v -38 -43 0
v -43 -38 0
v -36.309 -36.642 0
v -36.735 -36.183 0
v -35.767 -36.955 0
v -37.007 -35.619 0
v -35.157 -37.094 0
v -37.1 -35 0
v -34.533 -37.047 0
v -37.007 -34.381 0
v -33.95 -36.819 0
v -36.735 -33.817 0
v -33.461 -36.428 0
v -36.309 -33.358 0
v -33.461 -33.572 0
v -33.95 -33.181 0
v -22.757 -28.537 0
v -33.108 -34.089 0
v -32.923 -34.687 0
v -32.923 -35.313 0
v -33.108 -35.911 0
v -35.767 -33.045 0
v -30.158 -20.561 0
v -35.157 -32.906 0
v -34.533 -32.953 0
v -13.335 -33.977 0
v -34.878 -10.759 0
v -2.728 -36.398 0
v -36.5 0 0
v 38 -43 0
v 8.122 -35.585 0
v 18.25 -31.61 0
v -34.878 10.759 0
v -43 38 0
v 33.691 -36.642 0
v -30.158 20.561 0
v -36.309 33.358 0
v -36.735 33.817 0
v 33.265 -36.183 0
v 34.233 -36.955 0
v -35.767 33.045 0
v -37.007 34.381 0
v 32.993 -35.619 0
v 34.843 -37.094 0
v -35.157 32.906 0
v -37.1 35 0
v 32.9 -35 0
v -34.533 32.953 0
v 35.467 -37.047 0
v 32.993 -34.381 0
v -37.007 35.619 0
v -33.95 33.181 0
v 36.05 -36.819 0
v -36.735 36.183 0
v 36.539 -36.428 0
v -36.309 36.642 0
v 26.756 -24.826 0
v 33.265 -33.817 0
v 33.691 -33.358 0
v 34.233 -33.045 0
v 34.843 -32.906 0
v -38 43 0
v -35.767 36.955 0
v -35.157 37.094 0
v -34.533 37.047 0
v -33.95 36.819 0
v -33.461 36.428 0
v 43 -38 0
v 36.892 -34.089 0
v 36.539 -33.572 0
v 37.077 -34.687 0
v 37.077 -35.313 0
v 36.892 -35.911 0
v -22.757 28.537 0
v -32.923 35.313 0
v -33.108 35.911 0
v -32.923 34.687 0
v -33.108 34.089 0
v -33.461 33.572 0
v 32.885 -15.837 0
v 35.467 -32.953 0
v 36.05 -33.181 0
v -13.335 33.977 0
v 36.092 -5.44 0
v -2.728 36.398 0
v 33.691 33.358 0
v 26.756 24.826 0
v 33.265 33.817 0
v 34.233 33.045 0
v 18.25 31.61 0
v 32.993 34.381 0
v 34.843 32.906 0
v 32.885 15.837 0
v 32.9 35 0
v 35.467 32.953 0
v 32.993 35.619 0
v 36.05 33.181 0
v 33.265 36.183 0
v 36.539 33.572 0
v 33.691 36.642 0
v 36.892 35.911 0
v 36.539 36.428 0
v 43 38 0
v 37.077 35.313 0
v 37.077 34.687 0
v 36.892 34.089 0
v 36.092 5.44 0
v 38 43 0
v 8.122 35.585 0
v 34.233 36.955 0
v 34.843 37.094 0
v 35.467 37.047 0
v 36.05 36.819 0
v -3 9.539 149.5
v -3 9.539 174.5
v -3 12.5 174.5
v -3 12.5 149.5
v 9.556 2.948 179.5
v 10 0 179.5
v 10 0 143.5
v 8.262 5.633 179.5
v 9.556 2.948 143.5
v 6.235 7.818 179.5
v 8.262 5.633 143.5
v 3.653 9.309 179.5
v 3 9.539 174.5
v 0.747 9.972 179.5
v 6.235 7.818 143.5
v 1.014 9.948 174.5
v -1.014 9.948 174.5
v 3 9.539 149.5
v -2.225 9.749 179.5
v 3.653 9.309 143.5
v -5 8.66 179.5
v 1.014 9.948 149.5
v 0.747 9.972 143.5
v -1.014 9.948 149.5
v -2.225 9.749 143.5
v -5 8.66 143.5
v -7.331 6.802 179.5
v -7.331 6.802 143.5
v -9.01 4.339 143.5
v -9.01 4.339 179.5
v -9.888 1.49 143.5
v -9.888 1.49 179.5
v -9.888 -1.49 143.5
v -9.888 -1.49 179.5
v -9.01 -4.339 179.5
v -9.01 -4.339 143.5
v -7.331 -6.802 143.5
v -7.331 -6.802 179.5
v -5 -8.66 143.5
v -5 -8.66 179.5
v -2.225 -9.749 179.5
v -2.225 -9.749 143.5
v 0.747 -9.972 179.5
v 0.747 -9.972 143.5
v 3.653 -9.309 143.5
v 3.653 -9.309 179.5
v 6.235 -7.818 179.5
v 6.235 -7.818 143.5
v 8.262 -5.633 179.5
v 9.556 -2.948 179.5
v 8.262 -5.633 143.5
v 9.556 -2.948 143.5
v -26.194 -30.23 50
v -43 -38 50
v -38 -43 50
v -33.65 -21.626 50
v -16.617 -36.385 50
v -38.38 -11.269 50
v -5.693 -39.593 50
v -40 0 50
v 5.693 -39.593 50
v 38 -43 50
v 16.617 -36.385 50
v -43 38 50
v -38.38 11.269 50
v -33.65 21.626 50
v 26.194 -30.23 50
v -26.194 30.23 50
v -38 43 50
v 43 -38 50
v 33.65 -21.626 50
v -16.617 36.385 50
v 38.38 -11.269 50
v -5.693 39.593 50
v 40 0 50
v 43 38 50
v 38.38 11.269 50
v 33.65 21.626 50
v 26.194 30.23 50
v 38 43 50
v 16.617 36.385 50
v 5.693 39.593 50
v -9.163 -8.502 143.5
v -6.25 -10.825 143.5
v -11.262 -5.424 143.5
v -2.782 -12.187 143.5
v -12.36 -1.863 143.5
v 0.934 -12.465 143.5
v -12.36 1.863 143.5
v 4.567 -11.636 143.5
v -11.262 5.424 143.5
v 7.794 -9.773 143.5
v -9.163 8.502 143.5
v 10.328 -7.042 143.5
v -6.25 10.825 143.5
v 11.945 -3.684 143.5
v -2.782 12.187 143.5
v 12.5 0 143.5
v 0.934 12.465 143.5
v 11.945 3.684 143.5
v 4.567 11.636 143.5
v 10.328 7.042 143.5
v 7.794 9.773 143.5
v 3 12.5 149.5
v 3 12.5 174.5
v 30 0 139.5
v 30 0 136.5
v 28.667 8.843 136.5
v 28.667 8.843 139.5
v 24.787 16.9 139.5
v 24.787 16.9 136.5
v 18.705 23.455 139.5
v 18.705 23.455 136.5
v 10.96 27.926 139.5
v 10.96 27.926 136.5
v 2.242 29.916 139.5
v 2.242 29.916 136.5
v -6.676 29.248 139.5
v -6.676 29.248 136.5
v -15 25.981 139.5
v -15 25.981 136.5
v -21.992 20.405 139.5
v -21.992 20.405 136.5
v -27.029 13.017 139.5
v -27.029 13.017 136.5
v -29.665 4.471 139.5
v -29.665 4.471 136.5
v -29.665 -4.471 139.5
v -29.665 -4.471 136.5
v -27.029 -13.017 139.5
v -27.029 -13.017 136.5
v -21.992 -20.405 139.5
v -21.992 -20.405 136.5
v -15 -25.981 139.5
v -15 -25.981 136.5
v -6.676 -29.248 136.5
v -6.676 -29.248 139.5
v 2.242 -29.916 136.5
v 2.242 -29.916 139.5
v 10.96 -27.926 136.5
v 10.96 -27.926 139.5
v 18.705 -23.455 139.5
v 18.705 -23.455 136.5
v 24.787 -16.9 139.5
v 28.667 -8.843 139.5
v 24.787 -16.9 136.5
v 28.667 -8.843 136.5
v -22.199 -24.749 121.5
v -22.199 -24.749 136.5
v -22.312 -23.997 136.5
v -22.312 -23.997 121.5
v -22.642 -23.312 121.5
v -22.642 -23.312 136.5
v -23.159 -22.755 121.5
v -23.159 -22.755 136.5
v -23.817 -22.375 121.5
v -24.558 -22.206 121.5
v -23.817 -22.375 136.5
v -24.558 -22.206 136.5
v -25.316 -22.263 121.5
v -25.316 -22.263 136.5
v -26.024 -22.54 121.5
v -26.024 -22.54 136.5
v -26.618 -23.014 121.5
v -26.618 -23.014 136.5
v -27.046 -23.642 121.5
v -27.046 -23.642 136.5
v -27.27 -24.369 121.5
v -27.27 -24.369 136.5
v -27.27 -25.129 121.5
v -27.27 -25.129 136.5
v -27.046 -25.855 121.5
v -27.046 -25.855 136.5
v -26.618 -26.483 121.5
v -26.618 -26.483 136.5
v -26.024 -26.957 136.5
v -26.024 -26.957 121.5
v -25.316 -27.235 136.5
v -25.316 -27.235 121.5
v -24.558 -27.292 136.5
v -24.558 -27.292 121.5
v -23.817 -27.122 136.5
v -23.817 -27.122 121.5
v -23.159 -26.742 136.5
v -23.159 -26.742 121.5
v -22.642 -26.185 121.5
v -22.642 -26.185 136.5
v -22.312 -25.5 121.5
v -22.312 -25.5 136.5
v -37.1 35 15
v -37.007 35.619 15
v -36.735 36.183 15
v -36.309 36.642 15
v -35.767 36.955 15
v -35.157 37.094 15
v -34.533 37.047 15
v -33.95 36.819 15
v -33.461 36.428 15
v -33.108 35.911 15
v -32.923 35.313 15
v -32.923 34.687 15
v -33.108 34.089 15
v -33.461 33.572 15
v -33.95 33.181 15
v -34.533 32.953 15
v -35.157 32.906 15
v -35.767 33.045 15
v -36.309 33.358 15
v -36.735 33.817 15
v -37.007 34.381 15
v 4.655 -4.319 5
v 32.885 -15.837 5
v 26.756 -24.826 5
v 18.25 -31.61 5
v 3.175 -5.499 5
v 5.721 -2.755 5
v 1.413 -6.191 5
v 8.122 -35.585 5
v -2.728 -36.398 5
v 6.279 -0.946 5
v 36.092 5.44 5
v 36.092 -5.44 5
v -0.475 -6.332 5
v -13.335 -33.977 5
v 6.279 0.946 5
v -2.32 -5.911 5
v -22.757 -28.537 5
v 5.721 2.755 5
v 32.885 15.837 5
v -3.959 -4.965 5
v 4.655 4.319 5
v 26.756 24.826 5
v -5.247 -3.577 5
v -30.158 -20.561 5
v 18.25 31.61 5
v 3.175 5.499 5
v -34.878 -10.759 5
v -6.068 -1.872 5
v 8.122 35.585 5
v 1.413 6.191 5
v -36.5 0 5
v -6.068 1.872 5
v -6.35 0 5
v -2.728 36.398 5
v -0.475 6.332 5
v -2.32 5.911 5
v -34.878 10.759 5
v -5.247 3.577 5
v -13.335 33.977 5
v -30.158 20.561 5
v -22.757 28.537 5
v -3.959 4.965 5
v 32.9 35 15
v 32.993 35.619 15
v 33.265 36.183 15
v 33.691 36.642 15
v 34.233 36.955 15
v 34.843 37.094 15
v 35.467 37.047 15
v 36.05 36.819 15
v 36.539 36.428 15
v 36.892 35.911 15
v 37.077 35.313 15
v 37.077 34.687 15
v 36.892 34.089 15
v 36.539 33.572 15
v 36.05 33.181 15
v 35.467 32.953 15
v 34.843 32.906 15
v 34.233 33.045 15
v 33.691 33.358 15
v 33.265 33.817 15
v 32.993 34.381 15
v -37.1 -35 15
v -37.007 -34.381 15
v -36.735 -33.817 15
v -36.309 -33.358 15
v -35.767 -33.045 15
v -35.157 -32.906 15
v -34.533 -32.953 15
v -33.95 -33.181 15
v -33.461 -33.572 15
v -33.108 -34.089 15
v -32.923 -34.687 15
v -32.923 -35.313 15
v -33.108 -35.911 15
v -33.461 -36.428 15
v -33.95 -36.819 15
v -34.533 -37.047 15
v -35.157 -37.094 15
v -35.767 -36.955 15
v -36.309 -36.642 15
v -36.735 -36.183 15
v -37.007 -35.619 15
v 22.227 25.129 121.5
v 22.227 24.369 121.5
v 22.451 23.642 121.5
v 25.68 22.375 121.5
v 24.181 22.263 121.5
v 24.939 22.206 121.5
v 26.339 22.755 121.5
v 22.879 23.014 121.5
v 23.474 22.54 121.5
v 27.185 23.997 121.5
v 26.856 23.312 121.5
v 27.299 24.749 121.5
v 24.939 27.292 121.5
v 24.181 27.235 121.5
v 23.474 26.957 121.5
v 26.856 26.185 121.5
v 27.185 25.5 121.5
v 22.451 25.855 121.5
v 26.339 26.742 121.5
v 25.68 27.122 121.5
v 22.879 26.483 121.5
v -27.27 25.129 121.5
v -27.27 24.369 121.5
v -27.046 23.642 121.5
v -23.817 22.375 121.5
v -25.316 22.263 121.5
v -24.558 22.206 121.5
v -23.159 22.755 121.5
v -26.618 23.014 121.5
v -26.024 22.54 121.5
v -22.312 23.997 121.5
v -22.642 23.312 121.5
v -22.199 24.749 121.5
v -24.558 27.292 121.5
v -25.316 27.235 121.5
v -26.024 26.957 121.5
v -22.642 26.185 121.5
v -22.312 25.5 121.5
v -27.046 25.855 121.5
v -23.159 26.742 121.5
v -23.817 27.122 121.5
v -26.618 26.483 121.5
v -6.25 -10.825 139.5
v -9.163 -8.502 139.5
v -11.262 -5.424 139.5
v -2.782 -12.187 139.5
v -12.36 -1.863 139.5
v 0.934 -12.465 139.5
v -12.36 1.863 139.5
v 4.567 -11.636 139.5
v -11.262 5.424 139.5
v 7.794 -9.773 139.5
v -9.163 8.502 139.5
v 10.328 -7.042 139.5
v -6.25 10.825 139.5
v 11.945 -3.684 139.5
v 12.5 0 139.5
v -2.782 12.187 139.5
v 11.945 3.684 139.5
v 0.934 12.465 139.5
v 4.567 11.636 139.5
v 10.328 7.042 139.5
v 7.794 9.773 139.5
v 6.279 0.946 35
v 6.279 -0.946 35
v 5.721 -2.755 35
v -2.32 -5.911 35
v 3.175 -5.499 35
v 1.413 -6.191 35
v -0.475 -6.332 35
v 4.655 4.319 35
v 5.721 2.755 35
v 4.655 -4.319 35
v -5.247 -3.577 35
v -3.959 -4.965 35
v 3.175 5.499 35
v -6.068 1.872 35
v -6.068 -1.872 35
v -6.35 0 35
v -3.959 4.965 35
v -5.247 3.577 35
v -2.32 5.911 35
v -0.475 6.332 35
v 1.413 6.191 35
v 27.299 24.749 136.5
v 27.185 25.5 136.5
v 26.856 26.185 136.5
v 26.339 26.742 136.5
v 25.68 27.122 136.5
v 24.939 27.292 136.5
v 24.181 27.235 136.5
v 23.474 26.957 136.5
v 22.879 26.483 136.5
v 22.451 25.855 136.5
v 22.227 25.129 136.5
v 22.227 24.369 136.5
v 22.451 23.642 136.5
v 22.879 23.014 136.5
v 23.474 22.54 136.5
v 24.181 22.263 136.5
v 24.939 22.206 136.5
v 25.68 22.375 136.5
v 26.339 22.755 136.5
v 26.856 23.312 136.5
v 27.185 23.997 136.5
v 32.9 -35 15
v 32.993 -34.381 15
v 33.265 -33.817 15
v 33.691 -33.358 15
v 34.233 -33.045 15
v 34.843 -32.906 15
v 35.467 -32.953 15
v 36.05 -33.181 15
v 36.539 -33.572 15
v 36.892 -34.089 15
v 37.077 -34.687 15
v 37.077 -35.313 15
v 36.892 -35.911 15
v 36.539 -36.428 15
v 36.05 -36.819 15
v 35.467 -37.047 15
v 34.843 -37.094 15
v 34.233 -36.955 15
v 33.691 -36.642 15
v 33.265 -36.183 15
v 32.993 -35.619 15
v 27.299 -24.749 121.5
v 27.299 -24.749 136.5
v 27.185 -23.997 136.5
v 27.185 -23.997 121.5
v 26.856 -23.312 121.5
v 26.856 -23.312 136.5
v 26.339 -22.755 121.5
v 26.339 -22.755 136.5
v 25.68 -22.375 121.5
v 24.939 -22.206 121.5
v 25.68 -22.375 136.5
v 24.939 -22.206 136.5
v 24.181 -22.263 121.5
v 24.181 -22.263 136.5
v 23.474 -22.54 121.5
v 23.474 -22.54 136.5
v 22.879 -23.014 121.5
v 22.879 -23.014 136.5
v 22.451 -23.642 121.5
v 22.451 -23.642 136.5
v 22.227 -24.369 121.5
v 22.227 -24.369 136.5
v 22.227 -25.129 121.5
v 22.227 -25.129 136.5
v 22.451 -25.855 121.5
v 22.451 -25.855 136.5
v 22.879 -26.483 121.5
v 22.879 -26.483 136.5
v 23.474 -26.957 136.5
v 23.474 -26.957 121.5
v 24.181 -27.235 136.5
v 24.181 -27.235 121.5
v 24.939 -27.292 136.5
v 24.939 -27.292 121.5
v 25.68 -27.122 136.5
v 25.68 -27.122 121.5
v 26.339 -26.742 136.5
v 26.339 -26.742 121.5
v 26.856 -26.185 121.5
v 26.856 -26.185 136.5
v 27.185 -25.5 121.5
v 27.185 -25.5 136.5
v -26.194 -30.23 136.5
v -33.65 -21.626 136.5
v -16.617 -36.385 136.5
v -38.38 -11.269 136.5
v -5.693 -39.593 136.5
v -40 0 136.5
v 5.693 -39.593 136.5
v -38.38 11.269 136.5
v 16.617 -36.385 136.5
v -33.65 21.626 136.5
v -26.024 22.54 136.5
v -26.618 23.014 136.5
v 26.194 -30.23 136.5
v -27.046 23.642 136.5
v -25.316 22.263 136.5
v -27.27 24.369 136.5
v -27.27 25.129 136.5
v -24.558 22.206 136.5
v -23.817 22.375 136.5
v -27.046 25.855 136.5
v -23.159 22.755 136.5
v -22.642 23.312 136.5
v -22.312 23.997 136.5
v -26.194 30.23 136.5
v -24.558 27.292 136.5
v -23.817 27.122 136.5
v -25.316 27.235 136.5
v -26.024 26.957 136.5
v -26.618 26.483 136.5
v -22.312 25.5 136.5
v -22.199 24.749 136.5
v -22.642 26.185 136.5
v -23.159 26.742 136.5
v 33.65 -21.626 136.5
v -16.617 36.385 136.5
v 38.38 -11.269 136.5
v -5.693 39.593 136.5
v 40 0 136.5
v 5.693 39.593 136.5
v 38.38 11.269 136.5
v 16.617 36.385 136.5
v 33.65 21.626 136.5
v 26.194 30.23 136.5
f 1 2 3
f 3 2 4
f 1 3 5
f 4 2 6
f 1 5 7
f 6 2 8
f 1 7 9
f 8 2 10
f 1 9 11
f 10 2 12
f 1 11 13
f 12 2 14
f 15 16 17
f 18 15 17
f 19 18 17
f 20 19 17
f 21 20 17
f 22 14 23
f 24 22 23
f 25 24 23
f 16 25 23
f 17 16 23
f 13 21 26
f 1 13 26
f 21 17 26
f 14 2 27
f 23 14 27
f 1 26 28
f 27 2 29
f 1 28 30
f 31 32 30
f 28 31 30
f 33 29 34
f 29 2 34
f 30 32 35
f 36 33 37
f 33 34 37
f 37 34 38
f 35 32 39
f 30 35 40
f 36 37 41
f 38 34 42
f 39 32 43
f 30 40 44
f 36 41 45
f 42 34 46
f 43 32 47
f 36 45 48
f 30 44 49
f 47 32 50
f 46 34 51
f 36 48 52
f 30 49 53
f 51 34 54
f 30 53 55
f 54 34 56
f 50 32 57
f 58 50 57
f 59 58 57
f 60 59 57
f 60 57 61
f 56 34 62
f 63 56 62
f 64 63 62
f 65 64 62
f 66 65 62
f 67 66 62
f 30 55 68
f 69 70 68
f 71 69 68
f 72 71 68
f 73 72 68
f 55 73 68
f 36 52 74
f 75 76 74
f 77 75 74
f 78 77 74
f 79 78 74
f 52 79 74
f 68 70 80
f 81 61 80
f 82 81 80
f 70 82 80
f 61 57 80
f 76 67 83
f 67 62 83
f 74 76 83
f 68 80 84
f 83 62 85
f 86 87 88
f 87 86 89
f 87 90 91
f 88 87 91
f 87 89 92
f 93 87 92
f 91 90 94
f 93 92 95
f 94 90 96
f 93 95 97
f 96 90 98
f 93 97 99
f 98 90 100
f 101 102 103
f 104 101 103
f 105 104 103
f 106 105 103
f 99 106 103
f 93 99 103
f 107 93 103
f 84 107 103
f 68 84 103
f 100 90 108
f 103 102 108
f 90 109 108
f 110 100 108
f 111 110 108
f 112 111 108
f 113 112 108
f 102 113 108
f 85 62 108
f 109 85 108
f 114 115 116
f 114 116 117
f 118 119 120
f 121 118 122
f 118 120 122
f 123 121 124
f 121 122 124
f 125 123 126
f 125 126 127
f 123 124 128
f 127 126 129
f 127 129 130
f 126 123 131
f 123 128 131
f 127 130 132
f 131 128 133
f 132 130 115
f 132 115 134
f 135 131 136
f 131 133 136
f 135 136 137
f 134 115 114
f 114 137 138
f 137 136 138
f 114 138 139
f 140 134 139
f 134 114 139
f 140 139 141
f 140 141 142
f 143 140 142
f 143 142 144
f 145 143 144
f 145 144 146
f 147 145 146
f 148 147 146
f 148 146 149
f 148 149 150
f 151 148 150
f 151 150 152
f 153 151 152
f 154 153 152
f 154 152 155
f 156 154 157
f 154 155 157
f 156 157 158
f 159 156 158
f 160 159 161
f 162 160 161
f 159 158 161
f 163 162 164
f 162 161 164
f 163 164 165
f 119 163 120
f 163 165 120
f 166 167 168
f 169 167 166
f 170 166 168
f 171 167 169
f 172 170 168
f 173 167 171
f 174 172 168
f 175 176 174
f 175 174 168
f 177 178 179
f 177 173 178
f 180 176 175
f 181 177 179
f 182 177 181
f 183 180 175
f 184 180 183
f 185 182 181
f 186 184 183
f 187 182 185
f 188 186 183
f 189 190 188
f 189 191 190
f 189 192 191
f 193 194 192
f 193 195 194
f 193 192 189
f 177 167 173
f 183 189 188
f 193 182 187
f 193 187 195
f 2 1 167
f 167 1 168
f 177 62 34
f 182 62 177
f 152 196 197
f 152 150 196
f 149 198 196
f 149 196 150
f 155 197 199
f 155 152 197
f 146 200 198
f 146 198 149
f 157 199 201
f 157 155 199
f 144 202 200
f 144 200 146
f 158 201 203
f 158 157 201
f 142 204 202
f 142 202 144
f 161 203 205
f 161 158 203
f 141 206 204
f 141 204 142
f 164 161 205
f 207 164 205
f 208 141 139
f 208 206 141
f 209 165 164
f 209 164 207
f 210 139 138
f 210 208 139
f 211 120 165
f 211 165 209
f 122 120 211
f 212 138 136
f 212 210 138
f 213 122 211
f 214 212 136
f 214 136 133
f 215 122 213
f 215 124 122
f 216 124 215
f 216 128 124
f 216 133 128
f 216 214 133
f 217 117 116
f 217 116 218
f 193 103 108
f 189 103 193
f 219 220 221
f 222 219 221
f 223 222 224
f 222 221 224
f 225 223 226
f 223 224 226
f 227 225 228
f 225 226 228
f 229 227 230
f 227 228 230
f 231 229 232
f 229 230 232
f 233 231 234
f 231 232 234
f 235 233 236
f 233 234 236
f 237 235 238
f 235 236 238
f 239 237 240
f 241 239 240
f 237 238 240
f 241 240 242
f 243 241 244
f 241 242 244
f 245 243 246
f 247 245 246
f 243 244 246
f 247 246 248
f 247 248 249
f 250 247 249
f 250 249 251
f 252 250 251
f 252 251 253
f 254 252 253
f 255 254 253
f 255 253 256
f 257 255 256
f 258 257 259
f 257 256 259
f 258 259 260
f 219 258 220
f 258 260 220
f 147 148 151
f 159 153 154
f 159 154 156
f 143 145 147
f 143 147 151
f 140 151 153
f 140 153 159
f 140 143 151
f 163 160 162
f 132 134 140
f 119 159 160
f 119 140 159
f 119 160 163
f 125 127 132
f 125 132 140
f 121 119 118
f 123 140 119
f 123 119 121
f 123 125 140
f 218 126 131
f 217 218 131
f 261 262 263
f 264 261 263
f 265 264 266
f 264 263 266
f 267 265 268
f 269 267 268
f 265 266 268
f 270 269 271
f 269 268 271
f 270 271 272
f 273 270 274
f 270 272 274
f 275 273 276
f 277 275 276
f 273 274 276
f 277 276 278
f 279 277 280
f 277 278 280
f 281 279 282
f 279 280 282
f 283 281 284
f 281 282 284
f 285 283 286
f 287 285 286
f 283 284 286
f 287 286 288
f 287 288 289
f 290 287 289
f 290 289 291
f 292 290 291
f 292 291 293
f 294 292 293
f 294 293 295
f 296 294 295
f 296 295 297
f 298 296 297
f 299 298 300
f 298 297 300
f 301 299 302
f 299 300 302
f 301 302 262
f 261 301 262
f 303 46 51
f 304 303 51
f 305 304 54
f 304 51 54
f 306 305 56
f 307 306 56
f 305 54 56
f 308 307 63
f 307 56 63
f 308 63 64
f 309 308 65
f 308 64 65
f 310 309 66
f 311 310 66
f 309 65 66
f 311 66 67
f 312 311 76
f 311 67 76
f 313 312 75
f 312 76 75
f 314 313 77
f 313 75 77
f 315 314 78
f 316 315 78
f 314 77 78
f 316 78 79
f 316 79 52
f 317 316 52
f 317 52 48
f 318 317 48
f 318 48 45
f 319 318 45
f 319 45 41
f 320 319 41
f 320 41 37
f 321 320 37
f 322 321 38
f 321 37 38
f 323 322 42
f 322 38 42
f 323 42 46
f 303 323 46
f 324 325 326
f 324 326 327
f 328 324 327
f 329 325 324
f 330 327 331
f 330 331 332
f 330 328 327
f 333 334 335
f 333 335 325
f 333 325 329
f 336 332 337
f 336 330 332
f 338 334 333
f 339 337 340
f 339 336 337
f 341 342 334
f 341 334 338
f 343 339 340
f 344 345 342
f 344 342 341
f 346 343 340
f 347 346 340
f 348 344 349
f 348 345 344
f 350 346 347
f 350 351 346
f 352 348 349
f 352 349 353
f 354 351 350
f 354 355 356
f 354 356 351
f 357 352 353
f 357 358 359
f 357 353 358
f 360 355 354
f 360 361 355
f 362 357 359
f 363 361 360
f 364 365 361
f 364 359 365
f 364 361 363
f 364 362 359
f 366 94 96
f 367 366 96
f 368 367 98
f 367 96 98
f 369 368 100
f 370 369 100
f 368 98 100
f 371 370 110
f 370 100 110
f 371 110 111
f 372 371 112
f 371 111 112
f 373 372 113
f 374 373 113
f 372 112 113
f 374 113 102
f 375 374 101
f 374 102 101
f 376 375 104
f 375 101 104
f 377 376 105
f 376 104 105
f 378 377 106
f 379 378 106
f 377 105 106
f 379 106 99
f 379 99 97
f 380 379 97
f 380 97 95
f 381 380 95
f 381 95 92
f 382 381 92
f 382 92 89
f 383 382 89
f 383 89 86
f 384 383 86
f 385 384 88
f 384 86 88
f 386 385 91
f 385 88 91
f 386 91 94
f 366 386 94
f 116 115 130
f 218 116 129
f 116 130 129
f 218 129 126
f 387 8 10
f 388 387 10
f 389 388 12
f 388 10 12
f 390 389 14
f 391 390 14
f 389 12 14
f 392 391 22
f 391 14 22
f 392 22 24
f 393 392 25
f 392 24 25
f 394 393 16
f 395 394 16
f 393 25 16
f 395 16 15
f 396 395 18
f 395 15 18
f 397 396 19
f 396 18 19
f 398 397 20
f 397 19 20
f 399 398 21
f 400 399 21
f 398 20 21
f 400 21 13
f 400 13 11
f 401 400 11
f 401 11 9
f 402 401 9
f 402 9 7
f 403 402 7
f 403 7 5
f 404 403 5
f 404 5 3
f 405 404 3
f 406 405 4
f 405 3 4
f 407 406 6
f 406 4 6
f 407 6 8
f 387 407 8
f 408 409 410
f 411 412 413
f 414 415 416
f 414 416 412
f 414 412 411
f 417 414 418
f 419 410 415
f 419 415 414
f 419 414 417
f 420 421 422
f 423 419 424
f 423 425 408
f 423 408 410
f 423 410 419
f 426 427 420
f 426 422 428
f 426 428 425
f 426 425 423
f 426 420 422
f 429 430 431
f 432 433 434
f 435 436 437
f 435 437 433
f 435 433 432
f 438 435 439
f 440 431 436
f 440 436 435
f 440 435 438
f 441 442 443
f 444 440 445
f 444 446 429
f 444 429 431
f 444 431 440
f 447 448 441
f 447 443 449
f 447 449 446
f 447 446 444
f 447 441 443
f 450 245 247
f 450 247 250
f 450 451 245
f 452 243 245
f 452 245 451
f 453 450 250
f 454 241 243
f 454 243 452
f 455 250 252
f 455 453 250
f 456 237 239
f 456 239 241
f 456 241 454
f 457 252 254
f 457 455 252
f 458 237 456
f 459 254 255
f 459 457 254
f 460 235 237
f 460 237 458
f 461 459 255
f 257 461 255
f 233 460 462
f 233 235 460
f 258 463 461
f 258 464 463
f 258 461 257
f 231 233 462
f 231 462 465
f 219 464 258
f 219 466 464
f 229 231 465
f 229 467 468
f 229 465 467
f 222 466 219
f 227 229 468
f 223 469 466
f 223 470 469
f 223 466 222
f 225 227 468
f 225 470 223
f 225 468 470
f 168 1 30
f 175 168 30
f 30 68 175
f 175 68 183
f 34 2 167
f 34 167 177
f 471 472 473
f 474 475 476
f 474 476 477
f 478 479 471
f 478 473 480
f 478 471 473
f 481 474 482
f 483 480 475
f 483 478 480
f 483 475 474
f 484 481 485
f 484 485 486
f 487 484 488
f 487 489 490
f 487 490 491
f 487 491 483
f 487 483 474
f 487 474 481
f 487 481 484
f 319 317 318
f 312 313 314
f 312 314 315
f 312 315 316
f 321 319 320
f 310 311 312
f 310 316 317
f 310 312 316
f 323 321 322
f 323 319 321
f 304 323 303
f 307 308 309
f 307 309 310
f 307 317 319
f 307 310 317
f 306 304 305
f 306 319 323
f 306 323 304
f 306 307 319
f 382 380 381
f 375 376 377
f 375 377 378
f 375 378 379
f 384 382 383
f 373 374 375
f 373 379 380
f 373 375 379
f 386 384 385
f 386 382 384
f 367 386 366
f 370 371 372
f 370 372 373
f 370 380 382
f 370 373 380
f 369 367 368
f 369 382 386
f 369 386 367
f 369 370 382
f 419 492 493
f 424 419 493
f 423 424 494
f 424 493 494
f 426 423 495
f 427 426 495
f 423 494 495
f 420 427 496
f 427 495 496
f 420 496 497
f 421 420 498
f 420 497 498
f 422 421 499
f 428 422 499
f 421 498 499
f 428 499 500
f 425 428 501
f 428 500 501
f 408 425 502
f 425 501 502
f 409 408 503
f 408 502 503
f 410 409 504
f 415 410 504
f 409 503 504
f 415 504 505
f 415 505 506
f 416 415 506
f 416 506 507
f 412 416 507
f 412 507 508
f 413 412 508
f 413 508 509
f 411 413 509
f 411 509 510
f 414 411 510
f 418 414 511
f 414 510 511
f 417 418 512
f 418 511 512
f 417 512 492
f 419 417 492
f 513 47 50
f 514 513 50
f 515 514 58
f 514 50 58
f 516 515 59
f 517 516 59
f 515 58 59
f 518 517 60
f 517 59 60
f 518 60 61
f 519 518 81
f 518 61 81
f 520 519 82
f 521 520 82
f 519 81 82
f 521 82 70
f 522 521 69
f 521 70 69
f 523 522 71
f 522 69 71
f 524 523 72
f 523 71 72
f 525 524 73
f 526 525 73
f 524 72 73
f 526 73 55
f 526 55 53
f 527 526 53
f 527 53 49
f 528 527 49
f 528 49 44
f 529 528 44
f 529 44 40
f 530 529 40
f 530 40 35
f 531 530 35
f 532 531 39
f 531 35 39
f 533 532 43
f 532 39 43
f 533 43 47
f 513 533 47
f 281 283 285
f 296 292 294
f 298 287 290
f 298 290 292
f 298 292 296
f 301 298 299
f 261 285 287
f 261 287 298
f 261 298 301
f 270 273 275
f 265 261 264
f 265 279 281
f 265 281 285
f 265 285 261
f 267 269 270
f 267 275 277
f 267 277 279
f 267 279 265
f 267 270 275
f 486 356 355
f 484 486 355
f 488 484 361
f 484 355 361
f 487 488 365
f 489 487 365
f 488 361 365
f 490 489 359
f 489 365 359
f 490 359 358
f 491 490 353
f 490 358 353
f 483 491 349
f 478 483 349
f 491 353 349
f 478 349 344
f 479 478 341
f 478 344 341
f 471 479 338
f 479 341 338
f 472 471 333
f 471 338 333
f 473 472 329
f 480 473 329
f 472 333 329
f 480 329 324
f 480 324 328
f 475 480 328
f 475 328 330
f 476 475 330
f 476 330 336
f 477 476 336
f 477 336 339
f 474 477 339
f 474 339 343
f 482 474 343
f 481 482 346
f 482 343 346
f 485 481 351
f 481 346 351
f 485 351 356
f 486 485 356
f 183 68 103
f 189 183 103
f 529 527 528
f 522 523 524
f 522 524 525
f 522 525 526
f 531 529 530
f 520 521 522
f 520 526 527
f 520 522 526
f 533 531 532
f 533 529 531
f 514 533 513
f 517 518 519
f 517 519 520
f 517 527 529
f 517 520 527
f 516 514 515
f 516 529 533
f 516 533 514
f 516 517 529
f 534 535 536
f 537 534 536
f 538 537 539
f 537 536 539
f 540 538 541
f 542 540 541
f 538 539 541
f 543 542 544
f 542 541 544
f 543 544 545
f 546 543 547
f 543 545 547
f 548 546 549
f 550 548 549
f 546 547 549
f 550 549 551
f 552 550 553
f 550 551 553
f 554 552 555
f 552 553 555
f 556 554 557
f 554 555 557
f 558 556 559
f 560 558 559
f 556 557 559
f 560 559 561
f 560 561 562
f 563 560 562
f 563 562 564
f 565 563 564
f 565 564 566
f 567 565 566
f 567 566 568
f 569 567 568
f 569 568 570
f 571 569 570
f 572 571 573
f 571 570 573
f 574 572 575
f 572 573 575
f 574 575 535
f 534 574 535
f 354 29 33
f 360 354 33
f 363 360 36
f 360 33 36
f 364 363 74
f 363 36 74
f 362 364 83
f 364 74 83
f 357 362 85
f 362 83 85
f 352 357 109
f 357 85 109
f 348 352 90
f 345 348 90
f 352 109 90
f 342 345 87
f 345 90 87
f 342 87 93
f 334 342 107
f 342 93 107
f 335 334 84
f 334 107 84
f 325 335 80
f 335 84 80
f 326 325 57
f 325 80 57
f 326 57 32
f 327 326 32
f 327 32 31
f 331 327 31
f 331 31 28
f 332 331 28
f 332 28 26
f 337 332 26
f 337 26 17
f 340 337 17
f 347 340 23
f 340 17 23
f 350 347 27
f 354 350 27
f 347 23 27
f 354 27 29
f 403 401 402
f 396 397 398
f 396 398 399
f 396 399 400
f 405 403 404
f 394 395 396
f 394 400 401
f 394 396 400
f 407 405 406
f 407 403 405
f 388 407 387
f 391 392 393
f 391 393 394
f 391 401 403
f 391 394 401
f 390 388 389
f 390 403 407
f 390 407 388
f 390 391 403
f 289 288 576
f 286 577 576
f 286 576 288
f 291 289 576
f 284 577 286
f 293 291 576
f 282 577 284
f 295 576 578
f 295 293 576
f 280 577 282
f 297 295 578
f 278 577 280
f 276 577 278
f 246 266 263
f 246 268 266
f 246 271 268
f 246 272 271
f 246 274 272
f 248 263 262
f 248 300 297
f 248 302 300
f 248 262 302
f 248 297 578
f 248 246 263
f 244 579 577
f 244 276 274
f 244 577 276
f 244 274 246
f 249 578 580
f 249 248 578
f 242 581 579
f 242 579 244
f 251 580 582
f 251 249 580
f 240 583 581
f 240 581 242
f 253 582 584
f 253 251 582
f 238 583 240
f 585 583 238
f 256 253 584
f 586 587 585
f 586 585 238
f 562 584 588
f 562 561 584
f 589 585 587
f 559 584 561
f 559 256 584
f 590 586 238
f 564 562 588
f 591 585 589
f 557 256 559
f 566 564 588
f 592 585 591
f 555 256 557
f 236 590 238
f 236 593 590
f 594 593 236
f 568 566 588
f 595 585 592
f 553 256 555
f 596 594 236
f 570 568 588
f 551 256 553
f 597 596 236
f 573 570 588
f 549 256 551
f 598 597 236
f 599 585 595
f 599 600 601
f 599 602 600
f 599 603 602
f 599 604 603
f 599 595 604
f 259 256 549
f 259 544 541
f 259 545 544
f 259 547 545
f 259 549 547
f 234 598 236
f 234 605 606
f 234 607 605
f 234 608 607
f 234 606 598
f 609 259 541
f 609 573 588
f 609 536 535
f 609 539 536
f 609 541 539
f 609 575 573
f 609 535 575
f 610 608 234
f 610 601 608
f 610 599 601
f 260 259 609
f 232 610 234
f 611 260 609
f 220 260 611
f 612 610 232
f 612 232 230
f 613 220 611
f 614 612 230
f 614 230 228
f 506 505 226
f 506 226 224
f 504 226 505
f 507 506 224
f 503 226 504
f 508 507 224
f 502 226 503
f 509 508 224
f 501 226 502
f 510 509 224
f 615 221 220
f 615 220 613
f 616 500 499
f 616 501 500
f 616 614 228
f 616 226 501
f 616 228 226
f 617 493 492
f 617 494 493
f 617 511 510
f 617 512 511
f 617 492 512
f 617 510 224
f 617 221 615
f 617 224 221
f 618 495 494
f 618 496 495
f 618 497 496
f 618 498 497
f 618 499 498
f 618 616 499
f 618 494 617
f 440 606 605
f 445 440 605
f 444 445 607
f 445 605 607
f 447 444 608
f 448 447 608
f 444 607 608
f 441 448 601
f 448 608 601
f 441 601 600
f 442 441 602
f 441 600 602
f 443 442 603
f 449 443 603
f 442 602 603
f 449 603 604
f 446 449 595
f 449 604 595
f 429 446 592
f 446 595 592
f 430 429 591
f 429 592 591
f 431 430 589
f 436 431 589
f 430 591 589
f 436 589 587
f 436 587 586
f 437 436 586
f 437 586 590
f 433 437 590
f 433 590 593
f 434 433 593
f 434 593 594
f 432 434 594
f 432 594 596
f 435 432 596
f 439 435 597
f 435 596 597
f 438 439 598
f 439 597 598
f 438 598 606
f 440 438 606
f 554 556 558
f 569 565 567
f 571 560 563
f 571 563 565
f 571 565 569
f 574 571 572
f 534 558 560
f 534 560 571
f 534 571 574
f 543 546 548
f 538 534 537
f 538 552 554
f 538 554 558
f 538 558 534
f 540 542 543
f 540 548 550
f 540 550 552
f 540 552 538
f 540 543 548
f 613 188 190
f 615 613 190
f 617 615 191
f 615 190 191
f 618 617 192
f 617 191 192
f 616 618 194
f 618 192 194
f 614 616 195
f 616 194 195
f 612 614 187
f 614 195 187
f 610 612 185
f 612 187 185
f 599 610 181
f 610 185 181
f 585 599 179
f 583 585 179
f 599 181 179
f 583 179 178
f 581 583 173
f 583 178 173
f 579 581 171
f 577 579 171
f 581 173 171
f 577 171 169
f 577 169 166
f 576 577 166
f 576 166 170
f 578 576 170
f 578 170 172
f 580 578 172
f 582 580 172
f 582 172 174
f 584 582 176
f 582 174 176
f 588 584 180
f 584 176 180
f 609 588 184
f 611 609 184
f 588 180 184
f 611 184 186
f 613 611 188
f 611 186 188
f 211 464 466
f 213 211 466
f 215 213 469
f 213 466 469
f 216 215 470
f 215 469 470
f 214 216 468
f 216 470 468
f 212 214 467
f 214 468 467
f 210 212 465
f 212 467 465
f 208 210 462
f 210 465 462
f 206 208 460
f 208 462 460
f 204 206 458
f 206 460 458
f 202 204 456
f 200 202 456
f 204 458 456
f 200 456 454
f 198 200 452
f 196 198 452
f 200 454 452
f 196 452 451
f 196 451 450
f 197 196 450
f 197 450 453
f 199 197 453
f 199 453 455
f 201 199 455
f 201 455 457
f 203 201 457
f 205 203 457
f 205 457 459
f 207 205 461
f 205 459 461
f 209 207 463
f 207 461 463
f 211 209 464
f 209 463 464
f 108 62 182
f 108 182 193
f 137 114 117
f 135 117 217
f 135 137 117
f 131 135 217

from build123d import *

# Parameters (mm, degrees)
SKETCH_1_W          = 86
SKETCH_1_H          = 86
EXTRUDE_1_DEPTH     = 50
SKETCH_2_R          = 40
EXTRUDE_2_DEPTH     = 86.5
SKETCH_3_R          = 30
EXTRUDE_3_DEPTH     = 3
SKETCH_4_R          = 12.5
EXTRUDE_4_DEPTH     = 4
SKETCH_5_R          = 10
EXTRUDE_5_DEPTH     = 36
SKETCH_7_W          = 6
SKETCH_7_H          = 25
EXTRUDE_6_DEPTH     = 12.5
SKETCH_8_R          = 36.5
CUT_EXTRUDE_1_DEPTH = 5
SKETCH_9_R          = 6.35
CUT_EXTRUDE_2_DEPTH = 30
SKETCH_10_R         = 2.1
CUT_EXTRUDE_3_DEPTH = 15
CHAMFER_1_SIZE      = 5
SKETCH_11_R         = 2.55
CUT_EXTRUDE_4_DEPTH = 15


with BuildPart() as part:
    # 草图1 → 凸台-拉伸1 (new body)
    with BuildSketch(Plane.XY):
        Rectangle(SKETCH_1_W, SKETCH_1_H)
    extrude(amount=EXTRUDE_1_DEPTH)

    # 草图2 → 凸台-拉伸2 (add)
    with BuildSketch(Plane.XY.offset(50)):
        Circle(SKETCH_2_R)
    extrude(amount=EXTRUDE_2_DEPTH)

    # 草图3 → 凸台-拉伸3 (add)
    with BuildSketch(Plane.XY.offset(136.5)):
        Circle(SKETCH_3_R)
    extrude(amount=EXTRUDE_3_DEPTH)

    # 草图4 → 凸台-拉伸4 (add)
    with BuildSketch(Plane.XY.offset(139.5)):
        Circle(SKETCH_4_R)
    extrude(amount=EXTRUDE_4_DEPTH)

    # 草图5 → 凸台-拉伸5 (add)
    with BuildSketch(Plane.XY.offset(143.5)):
        Circle(SKETCH_5_R)
    extrude(amount=EXTRUDE_5_DEPTH)

    # 草图7 → 凸台-拉伸6 (add)
    with BuildSketch(Plane(origin=(0, 0, 0), x_dir=(1, 0, 0), z_dir=(0, 1, 0))):
        with Locations((0, -162)):
            Rectangle(SKETCH_7_W, SKETCH_7_H)
    extrude(amount=EXTRUDE_6_DEPTH)

    # 草图8 → 切除-拉伸1 (cut)
    with BuildSketch(Plane(origin=(0, 0, 0), x_dir=(-1, 0, 0), z_dir=(0, 0, -1))):
        Circle(SKETCH_8_R)
    extrude(amount=-CUT_EXTRUDE_1_DEPTH, mode=Mode.SUBTRACT)

    # 草图9 → 切除-拉伸2 (cut)
    with BuildSketch(Plane(origin=(0, 0, 5), x_dir=(-1, 0, 0), z_dir=(0, 0, -1))):
        Circle(SKETCH_9_R)
    extrude(amount=-CUT_EXTRUDE_2_DEPTH, mode=Mode.SUBTRACT)

    # 草图10 → 切除-拉伸3 (cut)
    with BuildSketch(Plane(origin=(0, 0, 0), x_dir=(-1, 0, 0), z_dir=(0, 0, -1))):
        with Locations((-35, 35)):
            Circle(SKETCH_10_R)
        with Locations((35, 35)):
            Circle(SKETCH_10_R)
        with Locations((35, -35)):
            Circle(SKETCH_10_R)
        with Locations((-35, -35)):
            Circle(SKETCH_10_R)
    extrude(amount=-CUT_EXTRUDE_3_DEPTH, mode=Mode.SUBTRACT)

    # 倒角1
    chamfer_1_edges = [part.edges().sort_by_distance(p)[0] for p in [
        (-43, 43, 25),
        (43, 43, 25),
        (43, -43, 25),
        (-43, -43, 25),
    ]]
    chamfer(chamfer_1_edges, length=CHAMFER_1_SIZE)

    # 草图11 → 切除-拉伸4 (cut)
    with BuildSketch(Plane.XY.offset(136.5)):
        with Locations((-24.748737342, 24.748737342)):
            Circle(SKETCH_11_R)
        with Locations((24.748737342, 24.748737342)):
            Circle(SKETCH_11_R)
        with Locations((24.748737342, -24.748737342)):
            Circle(SKETCH_11_R)
        with Locations((-24.748737342, -24.748737342)):
            Circle(SKETCH_11_R)
    extrude(amount=-CUT_EXTRUDE_4_DEPTH, mode=Mode.SUBTRACT)


solid = part.part
